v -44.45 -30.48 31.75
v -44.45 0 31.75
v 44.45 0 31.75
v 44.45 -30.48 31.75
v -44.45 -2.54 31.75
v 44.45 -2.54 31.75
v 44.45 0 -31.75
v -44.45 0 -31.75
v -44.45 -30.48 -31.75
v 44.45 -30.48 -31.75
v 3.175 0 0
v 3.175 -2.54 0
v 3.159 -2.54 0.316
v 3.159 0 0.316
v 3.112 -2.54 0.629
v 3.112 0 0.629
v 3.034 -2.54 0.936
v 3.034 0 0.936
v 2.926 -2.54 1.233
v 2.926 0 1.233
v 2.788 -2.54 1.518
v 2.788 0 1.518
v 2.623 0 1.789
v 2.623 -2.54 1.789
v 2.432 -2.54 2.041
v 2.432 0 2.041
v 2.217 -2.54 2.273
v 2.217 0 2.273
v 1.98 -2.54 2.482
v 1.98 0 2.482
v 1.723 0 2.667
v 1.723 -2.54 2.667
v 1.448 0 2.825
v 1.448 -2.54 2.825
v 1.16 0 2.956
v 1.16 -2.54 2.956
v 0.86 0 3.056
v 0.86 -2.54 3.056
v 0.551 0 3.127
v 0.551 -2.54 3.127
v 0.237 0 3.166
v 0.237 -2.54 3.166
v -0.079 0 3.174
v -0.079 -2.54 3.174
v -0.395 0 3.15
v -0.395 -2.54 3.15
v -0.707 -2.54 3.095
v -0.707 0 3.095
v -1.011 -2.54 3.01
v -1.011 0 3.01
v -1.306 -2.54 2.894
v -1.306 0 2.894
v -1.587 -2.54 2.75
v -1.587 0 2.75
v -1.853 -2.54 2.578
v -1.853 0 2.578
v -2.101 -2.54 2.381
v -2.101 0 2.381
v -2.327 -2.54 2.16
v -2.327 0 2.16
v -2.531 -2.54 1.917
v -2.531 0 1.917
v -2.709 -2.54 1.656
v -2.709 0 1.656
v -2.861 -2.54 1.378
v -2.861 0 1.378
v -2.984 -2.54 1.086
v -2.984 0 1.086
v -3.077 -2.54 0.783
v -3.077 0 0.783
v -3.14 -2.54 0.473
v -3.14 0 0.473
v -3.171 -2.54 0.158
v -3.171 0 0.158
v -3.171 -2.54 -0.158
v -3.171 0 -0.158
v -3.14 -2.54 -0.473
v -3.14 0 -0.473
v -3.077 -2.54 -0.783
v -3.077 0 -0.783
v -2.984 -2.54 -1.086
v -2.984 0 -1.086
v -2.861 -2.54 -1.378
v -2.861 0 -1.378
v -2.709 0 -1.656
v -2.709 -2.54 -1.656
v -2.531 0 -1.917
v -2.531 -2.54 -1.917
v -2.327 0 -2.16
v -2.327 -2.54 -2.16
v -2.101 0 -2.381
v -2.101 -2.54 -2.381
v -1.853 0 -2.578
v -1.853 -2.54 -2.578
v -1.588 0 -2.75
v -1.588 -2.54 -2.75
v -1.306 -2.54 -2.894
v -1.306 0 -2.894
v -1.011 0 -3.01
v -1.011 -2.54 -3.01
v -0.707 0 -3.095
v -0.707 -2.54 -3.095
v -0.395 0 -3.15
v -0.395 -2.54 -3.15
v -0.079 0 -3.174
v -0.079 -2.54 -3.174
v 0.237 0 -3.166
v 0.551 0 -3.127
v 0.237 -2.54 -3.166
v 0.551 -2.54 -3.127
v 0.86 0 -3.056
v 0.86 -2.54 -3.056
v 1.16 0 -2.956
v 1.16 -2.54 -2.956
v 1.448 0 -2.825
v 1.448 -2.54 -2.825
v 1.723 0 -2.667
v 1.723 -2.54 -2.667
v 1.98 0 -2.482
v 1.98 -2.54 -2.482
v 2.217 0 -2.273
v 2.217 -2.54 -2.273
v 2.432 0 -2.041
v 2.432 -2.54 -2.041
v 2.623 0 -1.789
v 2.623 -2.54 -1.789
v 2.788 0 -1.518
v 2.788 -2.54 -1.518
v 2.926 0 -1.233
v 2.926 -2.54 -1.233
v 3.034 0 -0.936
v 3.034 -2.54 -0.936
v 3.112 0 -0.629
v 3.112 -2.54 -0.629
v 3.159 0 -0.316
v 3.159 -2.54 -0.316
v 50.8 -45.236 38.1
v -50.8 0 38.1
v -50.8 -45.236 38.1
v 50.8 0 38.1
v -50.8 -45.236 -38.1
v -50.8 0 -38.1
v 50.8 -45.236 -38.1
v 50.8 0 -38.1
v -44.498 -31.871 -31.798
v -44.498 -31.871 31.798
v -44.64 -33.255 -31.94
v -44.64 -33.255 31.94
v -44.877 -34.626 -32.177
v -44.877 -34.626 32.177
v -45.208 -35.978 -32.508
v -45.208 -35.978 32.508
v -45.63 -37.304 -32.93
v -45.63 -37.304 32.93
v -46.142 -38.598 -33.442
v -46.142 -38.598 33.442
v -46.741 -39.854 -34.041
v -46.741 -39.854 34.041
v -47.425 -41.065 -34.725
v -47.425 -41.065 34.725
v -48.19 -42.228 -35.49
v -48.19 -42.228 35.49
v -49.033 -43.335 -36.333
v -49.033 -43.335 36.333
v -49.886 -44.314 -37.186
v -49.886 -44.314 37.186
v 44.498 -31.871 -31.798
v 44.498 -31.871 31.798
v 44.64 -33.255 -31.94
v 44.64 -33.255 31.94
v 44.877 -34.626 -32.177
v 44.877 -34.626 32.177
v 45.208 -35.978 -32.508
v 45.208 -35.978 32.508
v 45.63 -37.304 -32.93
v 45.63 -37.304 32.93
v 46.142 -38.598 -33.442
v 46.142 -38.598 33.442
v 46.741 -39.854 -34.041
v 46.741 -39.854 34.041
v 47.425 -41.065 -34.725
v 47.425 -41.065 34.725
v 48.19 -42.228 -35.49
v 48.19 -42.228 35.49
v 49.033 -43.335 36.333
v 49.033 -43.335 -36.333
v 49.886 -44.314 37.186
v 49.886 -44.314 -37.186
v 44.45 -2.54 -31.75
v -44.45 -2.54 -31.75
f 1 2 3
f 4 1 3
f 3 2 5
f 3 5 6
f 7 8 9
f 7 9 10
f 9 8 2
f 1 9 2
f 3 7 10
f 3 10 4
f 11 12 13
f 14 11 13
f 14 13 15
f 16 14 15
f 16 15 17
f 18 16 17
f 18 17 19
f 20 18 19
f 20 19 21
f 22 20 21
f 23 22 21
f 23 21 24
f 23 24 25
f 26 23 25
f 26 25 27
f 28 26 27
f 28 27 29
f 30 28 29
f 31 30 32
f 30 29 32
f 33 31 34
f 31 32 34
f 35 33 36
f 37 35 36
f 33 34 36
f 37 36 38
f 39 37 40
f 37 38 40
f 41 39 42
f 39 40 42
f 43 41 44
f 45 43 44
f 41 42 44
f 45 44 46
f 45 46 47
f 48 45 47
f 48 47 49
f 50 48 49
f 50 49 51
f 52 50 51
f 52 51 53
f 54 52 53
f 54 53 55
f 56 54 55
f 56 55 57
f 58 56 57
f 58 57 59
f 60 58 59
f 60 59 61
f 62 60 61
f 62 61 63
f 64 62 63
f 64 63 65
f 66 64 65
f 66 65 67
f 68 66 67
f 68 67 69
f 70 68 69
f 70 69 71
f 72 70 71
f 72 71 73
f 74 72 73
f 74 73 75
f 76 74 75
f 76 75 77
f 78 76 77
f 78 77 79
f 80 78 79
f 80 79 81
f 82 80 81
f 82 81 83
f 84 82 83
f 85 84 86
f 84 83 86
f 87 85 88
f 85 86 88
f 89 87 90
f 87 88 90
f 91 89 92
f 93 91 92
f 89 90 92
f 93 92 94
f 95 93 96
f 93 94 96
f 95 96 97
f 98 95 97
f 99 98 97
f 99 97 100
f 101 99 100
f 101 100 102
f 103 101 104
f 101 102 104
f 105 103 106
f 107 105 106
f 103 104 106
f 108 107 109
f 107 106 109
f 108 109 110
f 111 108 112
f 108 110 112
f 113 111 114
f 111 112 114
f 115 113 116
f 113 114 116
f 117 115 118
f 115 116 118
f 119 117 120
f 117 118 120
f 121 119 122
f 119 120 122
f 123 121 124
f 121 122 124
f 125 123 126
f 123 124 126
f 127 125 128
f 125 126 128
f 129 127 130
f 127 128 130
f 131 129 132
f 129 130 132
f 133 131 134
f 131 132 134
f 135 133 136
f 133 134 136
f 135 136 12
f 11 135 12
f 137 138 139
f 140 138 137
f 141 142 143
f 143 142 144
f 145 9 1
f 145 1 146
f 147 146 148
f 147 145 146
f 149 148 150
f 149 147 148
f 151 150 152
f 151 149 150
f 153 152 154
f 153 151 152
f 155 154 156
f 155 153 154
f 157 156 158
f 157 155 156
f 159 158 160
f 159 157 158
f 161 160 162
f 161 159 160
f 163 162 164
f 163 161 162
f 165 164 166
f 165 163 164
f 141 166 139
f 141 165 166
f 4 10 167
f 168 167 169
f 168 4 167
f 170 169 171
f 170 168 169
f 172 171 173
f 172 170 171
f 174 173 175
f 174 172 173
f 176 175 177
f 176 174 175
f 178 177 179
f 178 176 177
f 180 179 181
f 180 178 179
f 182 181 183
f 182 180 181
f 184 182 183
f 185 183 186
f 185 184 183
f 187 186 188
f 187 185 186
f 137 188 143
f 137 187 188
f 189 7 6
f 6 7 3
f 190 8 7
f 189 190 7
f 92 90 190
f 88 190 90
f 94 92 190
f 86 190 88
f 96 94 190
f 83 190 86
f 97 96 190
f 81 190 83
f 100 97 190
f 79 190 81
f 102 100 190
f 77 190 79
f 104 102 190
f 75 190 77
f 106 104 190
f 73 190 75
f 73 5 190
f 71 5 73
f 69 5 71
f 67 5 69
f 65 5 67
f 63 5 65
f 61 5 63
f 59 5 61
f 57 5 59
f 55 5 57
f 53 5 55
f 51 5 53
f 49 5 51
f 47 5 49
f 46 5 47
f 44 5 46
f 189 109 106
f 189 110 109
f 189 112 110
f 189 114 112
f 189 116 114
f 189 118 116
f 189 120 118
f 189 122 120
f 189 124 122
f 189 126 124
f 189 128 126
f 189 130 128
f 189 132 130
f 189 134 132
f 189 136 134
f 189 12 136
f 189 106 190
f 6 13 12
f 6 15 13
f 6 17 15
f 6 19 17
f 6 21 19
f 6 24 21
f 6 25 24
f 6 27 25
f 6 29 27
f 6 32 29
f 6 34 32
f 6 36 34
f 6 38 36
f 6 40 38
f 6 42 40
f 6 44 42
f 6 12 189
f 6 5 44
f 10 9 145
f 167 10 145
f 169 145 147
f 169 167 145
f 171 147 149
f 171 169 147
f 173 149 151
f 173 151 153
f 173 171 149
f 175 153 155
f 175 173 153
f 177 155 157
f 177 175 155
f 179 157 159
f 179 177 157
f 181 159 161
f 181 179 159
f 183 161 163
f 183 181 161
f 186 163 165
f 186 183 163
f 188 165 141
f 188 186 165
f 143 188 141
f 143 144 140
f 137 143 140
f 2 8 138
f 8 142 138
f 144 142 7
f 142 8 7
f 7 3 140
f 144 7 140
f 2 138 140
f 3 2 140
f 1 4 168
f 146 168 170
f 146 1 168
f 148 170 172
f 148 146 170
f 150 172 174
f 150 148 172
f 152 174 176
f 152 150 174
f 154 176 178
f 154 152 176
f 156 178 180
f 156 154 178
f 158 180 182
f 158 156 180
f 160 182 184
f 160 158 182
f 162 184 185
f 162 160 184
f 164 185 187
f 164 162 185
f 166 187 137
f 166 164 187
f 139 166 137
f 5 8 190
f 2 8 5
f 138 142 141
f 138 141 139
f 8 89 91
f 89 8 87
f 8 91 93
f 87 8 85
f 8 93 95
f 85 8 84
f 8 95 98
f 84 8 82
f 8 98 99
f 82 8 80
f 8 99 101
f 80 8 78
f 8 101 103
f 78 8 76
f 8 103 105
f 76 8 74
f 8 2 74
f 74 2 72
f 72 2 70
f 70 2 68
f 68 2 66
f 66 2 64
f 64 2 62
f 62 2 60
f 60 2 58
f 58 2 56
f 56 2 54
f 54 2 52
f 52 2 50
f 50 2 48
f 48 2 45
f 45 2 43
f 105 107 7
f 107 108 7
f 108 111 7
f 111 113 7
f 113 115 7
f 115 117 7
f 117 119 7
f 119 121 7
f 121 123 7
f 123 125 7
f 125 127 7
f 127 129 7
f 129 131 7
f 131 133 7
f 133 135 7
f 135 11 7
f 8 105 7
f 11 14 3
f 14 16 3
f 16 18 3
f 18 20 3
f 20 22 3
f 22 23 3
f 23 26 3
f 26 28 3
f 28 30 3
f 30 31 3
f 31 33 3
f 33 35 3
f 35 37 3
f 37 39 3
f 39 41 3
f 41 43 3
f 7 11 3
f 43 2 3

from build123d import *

# Parameters (mm, degrees)
F0_W         = 101.6
F0_H         = 76.2
F0_W_2       = 88.9
F0_H_2       = 63.5
F1_DEPTH     = 50.8
F2_DEPTH     = 2.54
F3_T1_DEPTH  = 63.5
F3_T3_DEPTH  = 88.9
F3_T9_DEPTH  = 139.7
F3_T15_DEPTH = 114.3
F3_T24_DEPTH = 139.7
F3_T30_DEPTH = 114.3
F3_T39_DEPTH = 139.7
F3_T45_DEPTH = 114.3
F3_T54_DEPTH = 114.3
F3_T60_DEPTH = 139.7
F4_R         = 3.175
F5_DEPTH     = 2.541


# Not quite as in the source:
# - a fillet or chamfer that OpenCascade refuses, or shapes differently, is made with other operations: its cross-section is extruded or revolved along the edge and cut away or added


with BuildPart() as f1:
    # F0 (on Front) → F1 (new body)
    with BuildSketch(Plane.XZ):
        Rectangle(F0_W, F0_H)
        Rectangle(F0_W_2, F0_H_2, mode=Mode.SUBTRACT)
    extrude(amount=F1_DEPTH)

    # F3: fillet of radius 20.32 on 4 edges, made by hand

    # F3_s2 → F3_t1 (cut)
    with BuildSketch(Plane.XY.offset(-31.75)):
        with BuildLine():
            ThreePointArc((-44.45, -30.48), (-50.4015902063, -44.8484097937), (-64.77, -50.8))
            Line((-64.77, -50.8), (-44.45, -50.8))
            Line((-44.45, -50.8), (-44.45, -30.48))
        make_face()
        with BuildLine():
            ThreePointArc((44.45, -30.48), (50.4015902063, -44.8484097937), (64.77, -50.8))
            Line((64.77, -50.8), (44.45, -50.8))
            Line((44.45, -50.8), (44.45, -30.48))
        make_face()
    extrude(amount=F3_T1_DEPTH, mode=Mode.SUBTRACT)

    # F3_s4 → F3_t3 (cut)
    with BuildSketch(Plane.YZ.offset(-44.45)):
        with BuildLine():
            ThreePointArc((-30.48, 31.75), (-44.8484097937, 37.7015902063), (-50.8, 52.07))
            Line((-50.8, 52.07), (-50.8, 31.75))
            Line((-50.8, 31.75), (-30.48, 31.75))
        make_face()
        with BuildLine():
            ThreePointArc((-30.48, -31.75), (-44.8484097937, -37.7015902063), (-50.8, -52.07))
            Line((-50.8, -52.07), (-50.8, -31.75))
            Line((-50.8, -31.75), (-30.48, -31.75))
        make_face()
    extrude(amount=F3_T3_DEPTH, mode=Mode.SUBTRACT)


with BuildPart() as f2:
    # F0 (on Front) → F2 (new body)
    with BuildSketch(Plane.XZ):
        Rectangle(F0_W_2, F0_H_2)
    extrude(amount=F2_DEPTH)

    # F4 (on face) → F5 (cut, through all)
    with BuildSketch(Plane.XZ.offset(2.54)):
        Circle(F4_R)
    extrude(amount=-F5_DEPTH, mode=Mode.SUBTRACT)


with BuildPart() as f3_tool7:
    # F3_s8 → F3_t9 (new body)
    with BuildSketch(Plane.YZ.offset(44.45)):
        with BuildLine():
            ThreePointArc((-30.48, -31.75), (-44.8484097937, -37.7015902063), (-50.8, -52.07))
            Line((-50.8, -52.07), (-50.8, -31.75))
            Line((-50.8, -31.75), (-30.48, -31.75))
        make_face()
    extrude(amount=-F3_T9_DEPTH)

    split(bisect_by=Plane.YZ.offset(-50.8), keep=Keep.TOP)

    split(bisect_by=Plane.XY.offset(-38.1), keep=Keep.TOP)

    split(bisect_by=Plane.YZ.offset(-44.45), keep=Keep.BOTTOM)


with BuildPart() as f3_tool13:
    # F3_s14 → F3_t15 (new body)
    with BuildSketch(Plane.XY.offset(-82.55)):
        with BuildLine():
            ThreePointArc((-44.45, -30.48), (-50.4015902063, -44.8484097937), (-64.77, -50.8))
            Line((-64.77, -50.8), (-44.45, -50.8))
            Line((-44.45, -50.8), (-44.45, -30.48))
        make_face()
    extrude(amount=F3_T15_DEPTH)

    split(bisect_by=Plane.YZ.offset(-50.8), keep=Keep.TOP)

    split(bisect_by=Plane.XY.offset(-38.1), keep=Keep.TOP)

    split(bisect_by=Plane.XY.offset(-31.75), keep=Keep.BOTTOM)


with BuildPart() as f3_tool7_1:
    add(f3_tool7.part)

    # F3_t19: intersect F3_tool13
    add(f3_tool13.part, mode=Mode.INTERSECT)


with BuildPart() as f1_1:
    add(f1.part)

    # F3_t5: cut F3_tool7
    add(f3_tool7_1.part, mode=Mode.SUBTRACT)


with BuildPart() as f3_tool22:
    # F3_s23 → F3_t24 (new body)
    with BuildSketch(Plane.YZ.offset(-95.25)):
        with BuildLine():
            ThreePointArc((-30.48, 31.75), (-44.8484097937, 37.7015902063), (-50.8, 52.07))
            Line((-50.8, 52.07), (-50.8, 31.75))
            Line((-50.8, 31.75), (-30.48, 31.75))
        make_face()
    extrude(amount=F3_T24_DEPTH)

    split(bisect_by=Plane.XY.offset(38.1), keep=Keep.BOTTOM)

    split(bisect_by=Plane.YZ.offset(-50.8), keep=Keep.TOP)

    split(bisect_by=Plane.YZ.offset(-44.45), keep=Keep.BOTTOM)


with BuildPart() as f3_tool28:
    # F3_s29 → F3_t30 (new body)
    with BuildSketch(Plane.XY.offset(-31.75)):
        with BuildLine():
            ThreePointArc((-44.45, -30.48), (-50.4015902063, -44.8484097937), (-64.77, -50.8))
            Line((-64.77, -50.8), (-44.45, -50.8))
            Line((-44.45, -50.8), (-44.45, -30.48))
        make_face()
    extrude(amount=F3_T30_DEPTH)

    split(bisect_by=Plane.XY.offset(38.1), keep=Keep.BOTTOM)

    split(bisect_by=Plane.YZ.offset(-50.8), keep=Keep.TOP)

    split(bisect_by=Plane.XY.offset(31.75), keep=Keep.TOP)


with BuildPart() as f3_tool22_1:
    add(f3_tool22.part)

    # F3_t34: intersect F3_tool28
    add(f3_tool28.part, mode=Mode.INTERSECT)


with BuildPart() as f1_2:
    add(f1_1.part)

    # F3_t20: cut F3_tool22
    add(f3_tool22_1.part, mode=Mode.SUBTRACT)


with BuildPart() as f3_tool37:
    # F3_s38 → F3_t39 (new body)
    with BuildSketch(Plane.YZ.offset(-44.45)):
        with BuildLine():
            ThreePointArc((-30.48, 31.75), (-44.8484097937, 37.7015902063), (-50.8, 52.07))
            Line((-50.8, 52.07), (-50.8, 31.75))
            Line((-50.8, 31.75), (-30.48, 31.75))
        make_face()
    extrude(amount=F3_T39_DEPTH)

    split(bisect_by=Plane.YZ.offset(50.8), keep=Keep.BOTTOM)

    split(bisect_by=Plane.XY.offset(38.1), keep=Keep.BOTTOM)

    split(bisect_by=Plane.YZ.offset(44.45), keep=Keep.TOP)


with BuildPart() as f3_tool43:
    # F3_s44 → F3_t45 (new body)
    with BuildSketch(Plane.XY.offset(82.55)):
        with BuildLine():
            ThreePointArc((44.45, -30.48), (50.4015902063, -44.8484097937), (64.77, -50.8))
            Line((64.77, -50.8), (44.45, -50.8))
            Line((44.45, -50.8), (44.45, -30.48))
        make_face()
    extrude(amount=-F3_T45_DEPTH)

    split(bisect_by=Plane.YZ.offset(50.8), keep=Keep.BOTTOM)

    split(bisect_by=Plane.XY.offset(38.1), keep=Keep.BOTTOM)

    split(bisect_by=Plane.XY.offset(31.75), keep=Keep.TOP)


with BuildPart() as f3_tool37_1:
    add(f3_tool37.part)

    # F3_t49: intersect F3_tool43
    add(f3_tool43.part, mode=Mode.INTERSECT)


with BuildPart() as f1_3:
    add(f1_2.part)

    # F3_t35: cut F3_tool37
    add(f3_tool37_1.part, mode=Mode.SUBTRACT)


with BuildPart() as f3_tool52:
    # F3_s53 → F3_t54 (new body)
    with BuildSketch(Plane.XY.offset(31.75)):
        with BuildLine():
            ThreePointArc((44.45, -30.48), (50.4015902063, -44.8484097937), (64.77, -50.8))
            Line((64.77, -50.8), (44.45, -50.8))
            Line((44.45, -50.8), (44.45, -30.48))
        make_face()
    extrude(amount=-F3_T54_DEPTH)

    split(bisect_by=Plane.YZ.offset(50.8), keep=Keep.BOTTOM)

    split(bisect_by=Plane.XY.offset(-38.1), keep=Keep.TOP)

    split(bisect_by=Plane.XY.offset(-31.75), keep=Keep.BOTTOM)


with BuildPart() as f3_tool58:
    # F3_s59 → F3_t60 (new body)
    with BuildSketch(Plane.YZ.offset(95.25)):
        with BuildLine():
            ThreePointArc((-30.48, -31.75), (-44.8484097937, -37.7015902063), (-50.8, -52.07))
            Line((-50.8, -52.07), (-50.8, -31.75))
            Line((-50.8, -31.75), (-30.48, -31.75))
        make_face()
    extrude(amount=-F3_T60_DEPTH)

    split(bisect_by=Plane.YZ.offset(50.8), keep=Keep.BOTTOM)

    split(bisect_by=Plane.XY.offset(-38.1), keep=Keep.TOP)

    split(bisect_by=Plane.YZ.offset(44.45), keep=Keep.TOP)


with BuildPart() as f3_tool52_1:
    add(f3_tool52.part)

    # F3_t64: intersect F3_tool58
    add(f3_tool58.part, mode=Mode.INTERSECT)


with BuildPart() as f1_4:
    add(f1_3.part)

    # F3_t50: cut F3_tool52
    add(f3_tool52_1.part, mode=Mode.SUBTRACT)


solid = Compound([f2.part, f1_4.part])
